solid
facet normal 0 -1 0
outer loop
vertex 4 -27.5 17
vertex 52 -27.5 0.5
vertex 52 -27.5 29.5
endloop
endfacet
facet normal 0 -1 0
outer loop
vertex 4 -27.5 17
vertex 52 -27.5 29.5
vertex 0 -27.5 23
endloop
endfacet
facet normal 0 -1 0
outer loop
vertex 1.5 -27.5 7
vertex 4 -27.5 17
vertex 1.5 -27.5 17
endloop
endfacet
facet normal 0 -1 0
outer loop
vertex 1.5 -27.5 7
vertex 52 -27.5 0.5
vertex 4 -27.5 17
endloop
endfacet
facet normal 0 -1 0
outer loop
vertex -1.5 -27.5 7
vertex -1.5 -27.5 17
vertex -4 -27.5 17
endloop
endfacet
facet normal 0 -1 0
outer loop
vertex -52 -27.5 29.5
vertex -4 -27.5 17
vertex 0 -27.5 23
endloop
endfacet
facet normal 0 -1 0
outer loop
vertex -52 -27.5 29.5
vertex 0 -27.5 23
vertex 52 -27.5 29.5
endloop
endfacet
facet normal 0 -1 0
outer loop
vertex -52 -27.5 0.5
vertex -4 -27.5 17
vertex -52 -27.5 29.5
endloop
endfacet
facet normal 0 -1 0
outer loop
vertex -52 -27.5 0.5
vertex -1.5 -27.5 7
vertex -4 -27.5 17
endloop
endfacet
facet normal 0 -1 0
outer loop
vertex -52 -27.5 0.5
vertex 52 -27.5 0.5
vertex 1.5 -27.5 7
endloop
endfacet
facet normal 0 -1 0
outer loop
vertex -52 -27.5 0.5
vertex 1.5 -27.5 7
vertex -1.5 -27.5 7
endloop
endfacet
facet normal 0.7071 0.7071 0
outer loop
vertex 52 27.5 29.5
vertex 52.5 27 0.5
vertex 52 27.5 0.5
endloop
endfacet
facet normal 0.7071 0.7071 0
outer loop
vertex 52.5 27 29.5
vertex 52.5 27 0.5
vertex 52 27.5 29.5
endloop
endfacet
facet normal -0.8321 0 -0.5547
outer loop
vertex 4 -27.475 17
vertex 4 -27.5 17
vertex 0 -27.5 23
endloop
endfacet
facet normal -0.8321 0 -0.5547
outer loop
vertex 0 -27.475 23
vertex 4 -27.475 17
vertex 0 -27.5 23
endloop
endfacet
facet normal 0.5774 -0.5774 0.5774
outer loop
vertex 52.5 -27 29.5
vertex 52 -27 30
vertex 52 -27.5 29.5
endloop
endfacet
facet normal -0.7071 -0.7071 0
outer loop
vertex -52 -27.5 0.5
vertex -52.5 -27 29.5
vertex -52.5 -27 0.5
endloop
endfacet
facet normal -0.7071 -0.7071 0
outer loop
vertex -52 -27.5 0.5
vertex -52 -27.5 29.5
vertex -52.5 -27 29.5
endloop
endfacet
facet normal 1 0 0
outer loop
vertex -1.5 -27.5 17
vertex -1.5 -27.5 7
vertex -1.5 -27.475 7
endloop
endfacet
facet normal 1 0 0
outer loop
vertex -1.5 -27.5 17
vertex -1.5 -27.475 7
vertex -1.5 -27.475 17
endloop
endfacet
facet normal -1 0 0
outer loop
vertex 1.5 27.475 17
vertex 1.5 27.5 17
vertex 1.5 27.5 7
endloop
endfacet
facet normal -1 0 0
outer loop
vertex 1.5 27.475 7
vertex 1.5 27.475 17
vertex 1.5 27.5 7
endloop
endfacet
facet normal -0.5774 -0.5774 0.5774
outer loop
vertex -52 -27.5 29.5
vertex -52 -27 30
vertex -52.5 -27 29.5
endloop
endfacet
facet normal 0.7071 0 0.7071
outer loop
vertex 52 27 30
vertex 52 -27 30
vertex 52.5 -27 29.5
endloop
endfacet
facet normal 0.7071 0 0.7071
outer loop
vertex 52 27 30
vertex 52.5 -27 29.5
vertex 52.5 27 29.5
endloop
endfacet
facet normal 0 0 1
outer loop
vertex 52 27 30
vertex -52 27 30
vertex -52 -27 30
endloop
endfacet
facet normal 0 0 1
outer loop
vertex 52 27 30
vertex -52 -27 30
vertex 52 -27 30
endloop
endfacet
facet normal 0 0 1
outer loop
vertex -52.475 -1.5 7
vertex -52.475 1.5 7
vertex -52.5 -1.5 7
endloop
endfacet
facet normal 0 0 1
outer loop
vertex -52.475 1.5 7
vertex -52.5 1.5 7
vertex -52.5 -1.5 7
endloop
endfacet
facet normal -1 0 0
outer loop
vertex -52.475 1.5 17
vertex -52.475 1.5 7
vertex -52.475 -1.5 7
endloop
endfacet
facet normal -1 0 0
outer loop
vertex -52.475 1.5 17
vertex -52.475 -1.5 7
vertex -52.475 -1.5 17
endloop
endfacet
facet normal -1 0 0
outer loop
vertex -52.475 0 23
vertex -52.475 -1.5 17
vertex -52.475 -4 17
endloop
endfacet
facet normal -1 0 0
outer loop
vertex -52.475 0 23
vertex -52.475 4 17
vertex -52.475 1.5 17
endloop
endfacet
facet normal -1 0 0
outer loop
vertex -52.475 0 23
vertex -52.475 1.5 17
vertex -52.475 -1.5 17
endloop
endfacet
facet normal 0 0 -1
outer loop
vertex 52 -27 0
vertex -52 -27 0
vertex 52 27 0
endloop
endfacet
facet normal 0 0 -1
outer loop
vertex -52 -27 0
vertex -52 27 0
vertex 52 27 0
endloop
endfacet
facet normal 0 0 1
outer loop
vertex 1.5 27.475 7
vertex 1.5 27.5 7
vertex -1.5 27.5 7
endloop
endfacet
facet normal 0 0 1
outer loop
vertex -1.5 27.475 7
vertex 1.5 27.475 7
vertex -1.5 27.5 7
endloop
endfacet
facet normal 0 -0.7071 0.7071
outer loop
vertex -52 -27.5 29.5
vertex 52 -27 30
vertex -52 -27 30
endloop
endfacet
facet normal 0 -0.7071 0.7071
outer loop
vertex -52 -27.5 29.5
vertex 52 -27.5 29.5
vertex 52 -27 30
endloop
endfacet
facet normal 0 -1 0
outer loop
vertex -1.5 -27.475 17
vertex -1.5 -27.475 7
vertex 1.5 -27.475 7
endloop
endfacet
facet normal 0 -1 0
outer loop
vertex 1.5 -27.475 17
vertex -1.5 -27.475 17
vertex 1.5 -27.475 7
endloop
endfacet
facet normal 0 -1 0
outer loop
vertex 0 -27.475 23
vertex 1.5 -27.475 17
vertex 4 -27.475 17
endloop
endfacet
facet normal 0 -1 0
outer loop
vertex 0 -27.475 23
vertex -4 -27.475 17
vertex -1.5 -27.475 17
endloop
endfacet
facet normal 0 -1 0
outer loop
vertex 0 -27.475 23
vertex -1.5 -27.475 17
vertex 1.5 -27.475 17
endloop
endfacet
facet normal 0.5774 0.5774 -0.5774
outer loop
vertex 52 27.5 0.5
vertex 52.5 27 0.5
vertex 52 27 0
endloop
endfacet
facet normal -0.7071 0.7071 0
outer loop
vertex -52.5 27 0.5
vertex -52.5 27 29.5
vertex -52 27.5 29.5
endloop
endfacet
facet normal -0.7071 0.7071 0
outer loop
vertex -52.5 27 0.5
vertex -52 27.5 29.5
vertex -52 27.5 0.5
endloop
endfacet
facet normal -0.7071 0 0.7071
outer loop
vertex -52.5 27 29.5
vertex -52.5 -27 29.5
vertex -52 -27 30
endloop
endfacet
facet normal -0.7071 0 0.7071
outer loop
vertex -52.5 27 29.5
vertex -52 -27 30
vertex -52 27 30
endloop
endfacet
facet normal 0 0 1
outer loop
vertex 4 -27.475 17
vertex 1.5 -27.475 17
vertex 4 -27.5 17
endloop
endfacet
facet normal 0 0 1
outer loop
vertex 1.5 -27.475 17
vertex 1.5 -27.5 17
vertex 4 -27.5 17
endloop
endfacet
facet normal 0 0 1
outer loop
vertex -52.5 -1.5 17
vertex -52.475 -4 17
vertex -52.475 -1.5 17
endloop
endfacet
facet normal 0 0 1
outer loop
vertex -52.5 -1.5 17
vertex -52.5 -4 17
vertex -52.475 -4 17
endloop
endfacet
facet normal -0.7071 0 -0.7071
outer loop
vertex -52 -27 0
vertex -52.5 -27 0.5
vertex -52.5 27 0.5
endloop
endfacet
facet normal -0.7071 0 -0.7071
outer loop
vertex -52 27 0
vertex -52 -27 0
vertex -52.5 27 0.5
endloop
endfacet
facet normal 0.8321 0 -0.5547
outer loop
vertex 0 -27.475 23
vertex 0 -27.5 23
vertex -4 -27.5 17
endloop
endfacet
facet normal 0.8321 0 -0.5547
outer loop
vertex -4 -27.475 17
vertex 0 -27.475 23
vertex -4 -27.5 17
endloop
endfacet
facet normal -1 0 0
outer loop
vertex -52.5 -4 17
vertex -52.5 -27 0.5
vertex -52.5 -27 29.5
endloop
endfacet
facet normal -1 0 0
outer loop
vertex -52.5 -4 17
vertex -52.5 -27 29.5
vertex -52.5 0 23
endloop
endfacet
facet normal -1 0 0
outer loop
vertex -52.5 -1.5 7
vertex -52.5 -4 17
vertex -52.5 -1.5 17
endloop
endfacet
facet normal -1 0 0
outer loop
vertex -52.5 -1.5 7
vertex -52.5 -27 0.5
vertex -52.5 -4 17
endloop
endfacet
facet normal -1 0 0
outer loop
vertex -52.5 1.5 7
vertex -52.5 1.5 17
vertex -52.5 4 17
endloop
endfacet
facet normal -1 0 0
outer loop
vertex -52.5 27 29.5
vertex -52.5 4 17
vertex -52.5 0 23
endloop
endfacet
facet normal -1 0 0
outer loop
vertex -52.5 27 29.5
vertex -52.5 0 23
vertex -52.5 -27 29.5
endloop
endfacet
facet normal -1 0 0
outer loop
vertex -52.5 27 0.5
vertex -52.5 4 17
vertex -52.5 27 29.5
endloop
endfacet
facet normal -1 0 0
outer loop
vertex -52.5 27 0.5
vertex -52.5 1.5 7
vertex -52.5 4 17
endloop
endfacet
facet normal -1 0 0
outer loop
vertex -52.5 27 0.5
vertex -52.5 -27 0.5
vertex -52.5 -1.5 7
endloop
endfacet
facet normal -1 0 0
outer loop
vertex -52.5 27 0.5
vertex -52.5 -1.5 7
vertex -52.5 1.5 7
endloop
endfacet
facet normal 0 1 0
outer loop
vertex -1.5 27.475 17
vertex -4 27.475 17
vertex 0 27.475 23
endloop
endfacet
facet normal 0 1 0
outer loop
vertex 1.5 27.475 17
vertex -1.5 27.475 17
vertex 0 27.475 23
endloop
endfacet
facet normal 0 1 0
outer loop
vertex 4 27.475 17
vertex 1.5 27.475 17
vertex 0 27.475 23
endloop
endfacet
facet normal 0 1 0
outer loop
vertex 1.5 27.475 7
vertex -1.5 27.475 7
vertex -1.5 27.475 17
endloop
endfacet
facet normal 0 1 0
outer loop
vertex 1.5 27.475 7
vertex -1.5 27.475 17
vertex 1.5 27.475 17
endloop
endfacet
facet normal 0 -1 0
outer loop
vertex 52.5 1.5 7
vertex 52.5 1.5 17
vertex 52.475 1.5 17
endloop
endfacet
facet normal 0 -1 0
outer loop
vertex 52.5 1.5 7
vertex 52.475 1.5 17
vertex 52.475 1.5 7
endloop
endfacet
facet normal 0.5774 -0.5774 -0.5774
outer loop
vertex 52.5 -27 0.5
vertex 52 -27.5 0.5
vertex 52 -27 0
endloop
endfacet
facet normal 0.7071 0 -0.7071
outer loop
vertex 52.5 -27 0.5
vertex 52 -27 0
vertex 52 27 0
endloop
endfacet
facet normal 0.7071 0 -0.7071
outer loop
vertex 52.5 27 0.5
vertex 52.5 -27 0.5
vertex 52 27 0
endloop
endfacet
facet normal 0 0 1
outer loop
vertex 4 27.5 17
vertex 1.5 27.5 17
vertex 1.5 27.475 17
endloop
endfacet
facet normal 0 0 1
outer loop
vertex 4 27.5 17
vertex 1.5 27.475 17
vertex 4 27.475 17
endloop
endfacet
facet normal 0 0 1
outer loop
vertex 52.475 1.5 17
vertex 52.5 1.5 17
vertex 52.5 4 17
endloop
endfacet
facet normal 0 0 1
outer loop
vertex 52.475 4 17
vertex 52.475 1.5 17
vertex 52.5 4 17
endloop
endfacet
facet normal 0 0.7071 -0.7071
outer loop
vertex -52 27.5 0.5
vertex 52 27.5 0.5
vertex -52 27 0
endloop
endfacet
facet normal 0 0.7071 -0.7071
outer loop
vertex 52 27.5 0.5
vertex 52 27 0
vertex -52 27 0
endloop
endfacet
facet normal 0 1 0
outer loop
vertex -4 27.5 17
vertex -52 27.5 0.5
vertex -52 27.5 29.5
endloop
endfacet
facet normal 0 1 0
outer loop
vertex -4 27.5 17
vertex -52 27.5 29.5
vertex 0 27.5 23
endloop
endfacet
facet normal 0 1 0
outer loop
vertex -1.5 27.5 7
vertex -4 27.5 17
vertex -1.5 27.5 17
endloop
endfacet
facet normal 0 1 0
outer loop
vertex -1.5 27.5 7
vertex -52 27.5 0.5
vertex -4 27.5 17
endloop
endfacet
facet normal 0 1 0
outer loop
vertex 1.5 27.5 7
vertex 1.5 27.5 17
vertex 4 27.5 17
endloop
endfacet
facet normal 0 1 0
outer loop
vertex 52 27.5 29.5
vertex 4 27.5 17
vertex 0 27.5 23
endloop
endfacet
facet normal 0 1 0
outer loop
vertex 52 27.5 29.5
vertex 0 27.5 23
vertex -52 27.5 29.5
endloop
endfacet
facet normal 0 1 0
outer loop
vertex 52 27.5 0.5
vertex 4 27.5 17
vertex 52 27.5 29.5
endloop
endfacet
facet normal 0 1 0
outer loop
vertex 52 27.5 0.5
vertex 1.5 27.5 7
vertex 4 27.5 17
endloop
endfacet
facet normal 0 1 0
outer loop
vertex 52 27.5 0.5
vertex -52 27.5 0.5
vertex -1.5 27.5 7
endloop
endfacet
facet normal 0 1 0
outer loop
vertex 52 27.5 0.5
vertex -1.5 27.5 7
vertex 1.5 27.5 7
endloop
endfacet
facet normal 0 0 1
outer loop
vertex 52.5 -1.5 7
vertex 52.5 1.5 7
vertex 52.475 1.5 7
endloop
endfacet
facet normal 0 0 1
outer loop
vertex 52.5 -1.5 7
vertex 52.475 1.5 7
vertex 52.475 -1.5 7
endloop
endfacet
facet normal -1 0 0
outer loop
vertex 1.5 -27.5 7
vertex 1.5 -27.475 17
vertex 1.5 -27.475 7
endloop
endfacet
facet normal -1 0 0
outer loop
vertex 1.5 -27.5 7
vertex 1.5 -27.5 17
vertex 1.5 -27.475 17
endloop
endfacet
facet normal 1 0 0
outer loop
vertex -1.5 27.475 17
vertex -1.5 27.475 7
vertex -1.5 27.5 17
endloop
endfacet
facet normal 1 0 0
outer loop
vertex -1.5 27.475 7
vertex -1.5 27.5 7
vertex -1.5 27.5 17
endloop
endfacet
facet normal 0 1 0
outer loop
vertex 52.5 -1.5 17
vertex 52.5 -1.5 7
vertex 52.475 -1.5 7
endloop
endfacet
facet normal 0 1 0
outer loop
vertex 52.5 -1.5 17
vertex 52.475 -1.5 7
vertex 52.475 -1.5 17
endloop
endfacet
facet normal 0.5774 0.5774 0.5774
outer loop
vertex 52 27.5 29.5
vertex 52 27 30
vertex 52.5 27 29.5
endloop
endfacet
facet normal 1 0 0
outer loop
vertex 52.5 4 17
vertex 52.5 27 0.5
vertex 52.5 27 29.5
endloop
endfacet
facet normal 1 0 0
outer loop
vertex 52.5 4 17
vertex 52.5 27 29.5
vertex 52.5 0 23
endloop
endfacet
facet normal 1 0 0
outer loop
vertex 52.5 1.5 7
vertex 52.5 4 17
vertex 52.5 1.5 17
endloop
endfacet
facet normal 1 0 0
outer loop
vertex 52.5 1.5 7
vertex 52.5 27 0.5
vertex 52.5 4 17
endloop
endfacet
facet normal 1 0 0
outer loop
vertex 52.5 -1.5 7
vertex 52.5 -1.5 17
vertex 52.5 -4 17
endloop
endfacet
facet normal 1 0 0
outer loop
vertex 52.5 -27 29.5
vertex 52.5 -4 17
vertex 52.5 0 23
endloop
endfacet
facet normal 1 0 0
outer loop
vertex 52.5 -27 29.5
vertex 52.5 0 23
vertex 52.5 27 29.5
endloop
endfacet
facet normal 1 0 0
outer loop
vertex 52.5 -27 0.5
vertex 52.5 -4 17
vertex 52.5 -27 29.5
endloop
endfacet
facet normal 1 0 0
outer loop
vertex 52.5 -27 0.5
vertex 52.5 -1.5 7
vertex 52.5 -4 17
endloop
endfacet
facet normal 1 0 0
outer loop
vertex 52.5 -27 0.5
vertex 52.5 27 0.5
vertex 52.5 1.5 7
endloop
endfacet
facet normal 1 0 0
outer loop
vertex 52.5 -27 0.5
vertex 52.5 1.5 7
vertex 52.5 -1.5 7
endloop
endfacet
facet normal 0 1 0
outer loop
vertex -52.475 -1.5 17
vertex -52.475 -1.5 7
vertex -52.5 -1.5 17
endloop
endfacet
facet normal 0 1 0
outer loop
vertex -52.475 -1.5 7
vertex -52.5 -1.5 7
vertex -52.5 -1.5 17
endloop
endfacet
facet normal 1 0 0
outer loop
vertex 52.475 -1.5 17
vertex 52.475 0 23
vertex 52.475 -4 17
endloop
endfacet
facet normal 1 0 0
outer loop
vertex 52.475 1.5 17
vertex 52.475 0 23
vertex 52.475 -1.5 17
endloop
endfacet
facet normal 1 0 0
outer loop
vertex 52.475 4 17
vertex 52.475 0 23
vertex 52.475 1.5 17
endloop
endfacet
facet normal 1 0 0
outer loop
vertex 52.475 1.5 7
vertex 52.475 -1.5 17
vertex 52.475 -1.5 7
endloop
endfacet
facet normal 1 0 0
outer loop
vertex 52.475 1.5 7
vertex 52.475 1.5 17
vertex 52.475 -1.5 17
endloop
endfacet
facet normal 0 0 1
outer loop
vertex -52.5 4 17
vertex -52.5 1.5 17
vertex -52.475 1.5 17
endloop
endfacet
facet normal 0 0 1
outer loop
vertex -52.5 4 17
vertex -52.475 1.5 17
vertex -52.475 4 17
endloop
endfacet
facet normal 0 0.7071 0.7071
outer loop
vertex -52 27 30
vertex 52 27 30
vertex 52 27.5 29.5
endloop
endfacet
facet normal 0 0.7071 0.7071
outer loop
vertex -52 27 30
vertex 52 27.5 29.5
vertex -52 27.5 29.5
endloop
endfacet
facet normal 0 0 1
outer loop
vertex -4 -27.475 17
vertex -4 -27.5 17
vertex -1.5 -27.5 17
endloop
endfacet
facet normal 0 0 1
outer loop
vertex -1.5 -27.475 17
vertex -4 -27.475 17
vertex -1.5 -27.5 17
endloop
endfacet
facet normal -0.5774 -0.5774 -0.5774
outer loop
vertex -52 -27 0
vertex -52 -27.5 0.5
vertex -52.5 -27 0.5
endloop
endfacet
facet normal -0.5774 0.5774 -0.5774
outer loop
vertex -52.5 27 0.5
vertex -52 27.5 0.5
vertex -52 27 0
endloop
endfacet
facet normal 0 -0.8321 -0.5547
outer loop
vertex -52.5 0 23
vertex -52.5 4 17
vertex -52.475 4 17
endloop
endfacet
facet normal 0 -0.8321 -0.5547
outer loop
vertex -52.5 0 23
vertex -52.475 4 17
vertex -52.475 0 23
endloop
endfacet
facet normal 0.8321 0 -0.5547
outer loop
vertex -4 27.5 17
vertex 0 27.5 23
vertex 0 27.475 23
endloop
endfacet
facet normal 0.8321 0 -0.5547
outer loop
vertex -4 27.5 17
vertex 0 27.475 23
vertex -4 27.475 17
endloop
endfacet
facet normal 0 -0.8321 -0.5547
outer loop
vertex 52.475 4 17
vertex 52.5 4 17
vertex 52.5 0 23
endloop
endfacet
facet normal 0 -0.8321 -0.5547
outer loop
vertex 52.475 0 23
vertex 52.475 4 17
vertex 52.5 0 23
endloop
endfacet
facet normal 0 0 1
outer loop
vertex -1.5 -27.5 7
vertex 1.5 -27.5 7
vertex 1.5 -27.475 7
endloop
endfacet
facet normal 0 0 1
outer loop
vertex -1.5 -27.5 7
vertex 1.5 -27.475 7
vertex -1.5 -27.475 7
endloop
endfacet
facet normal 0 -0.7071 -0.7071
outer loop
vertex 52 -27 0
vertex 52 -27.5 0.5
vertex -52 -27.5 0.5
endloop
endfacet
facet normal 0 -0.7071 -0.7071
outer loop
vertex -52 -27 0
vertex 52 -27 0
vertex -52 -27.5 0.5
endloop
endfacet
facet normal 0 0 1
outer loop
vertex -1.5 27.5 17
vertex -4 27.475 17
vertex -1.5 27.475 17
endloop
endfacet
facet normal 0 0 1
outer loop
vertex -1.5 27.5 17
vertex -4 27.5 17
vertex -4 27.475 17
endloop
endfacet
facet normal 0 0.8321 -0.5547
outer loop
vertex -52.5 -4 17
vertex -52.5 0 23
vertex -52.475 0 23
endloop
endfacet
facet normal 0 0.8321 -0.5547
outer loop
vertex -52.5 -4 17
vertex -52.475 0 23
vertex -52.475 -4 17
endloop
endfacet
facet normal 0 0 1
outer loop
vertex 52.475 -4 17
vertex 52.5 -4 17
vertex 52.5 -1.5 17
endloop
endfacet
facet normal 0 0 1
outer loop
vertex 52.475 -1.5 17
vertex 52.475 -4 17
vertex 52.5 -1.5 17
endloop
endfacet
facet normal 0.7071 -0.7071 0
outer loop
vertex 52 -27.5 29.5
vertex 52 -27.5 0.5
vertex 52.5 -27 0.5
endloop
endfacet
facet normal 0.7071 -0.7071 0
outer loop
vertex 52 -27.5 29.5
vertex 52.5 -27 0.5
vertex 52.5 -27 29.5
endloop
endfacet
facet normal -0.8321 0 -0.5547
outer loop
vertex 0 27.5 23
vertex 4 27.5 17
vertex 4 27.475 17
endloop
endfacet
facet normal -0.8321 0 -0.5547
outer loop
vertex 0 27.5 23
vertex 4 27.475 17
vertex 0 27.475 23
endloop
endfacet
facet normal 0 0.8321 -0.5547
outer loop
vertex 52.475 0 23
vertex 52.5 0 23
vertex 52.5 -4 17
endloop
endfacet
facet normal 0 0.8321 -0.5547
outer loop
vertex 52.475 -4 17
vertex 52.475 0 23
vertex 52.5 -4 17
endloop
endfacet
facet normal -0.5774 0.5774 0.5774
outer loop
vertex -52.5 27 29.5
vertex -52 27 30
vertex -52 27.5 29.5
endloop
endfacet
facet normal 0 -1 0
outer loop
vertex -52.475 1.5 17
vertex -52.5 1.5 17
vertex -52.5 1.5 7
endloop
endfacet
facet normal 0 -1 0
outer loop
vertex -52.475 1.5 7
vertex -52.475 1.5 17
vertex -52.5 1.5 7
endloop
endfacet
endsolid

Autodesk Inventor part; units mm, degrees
ref_plane "YZ Plane" through (0, 0, 0) normal (1, 0, 0) x (0, 1, 0)
ref_plane "XZ Plane" through (0, 0, 0) normal (0, 1, 0) x (-1, 0, 0)
ref_plane "XY Plane" through (0, 0, 0) normal (0, 0, 1) x (1, 0, 0)
sketch "Sketch1" plane through (0, 0, 0) normal (0, 0, 1) x (1, 0, 0)
  line L0 (0, 38.5) -> (0, -38.5) projected
  line L1 (-73.5, 0) -> (73.5, 0) projected
  line L2 (-52.5, 27.5) -> (52.5, 27.5)
  line L3 (52.5, 27.5) -> (52.5, -27.5)
  line L4 (52.5, -27.5) -> (-52.5, -27.5)
  line L5 (-52.5, -27.5) -> (-52.5, 27.5)
  point P0 (0, 0)
  point P1 (0, 27.5)
  point P2 (52.5, 0)
  dimension "d0" = 55
  dimension "d1" = 105
extrude "Extrusion1" add sketch "Sketch1" along normal blind 30
chamfer "Chamfer1" distance 0.5 angle 45 12 edges at (0, -27.5, 30) (-52.5, 0, 30) (0, 27.5, 30) (52.5, 0, 30) (52.5, 27.5, 15) (52.5, -27.5, 15) (-52.5, -27.5, 15) (0, -27.5, 0) (52.5, 0, 0) (0, 27.5, 0) (-52.5, 27.5, 15) (-52.5, 0, 0)
sketch "Sketch2" plane through (-52, -27.5, 0.5) normal (0, -1, 0) x (1, 0, 0)
  line L0 (0, 0) -> (0, 29) projected
  line L1 (52, 22.5) -> (48, 16.5)
  line L2 (48, 16.5) -> (56, 16.5)
  line L3 (56, 16.5) -> (52, 22.5)
  line L4 (50.5, 16.5) -> (53.5, 16.5)
  line L5 (53.5, 16.5) -> (53.5, 6.5)
  line L6 (53.5, 6.5) -> (50.5, 6.5)
  line L7 (50.5, 6.5) -> (50.5, 16.5)
  line L8 (52, 22.5) -> (52, 4.7859)
  line L9 (104, 29.5) -> (0, 29.5) projected
  point P0 (52, -0.5)
  dimension "d7" = 8
  dimension "d8" = 3
  dimension "d9" = 4
  dimension "d10" = 1.5
  dimension "d11" = 7
  dimension "d12" = 6
  dimension "d13" = 10
extrude "Extrusion2" cut sketch "Sketch2" against normal blind 0.025
sketch "Sketch3" plane through (-52, 27.5, 0.5) normal (0, 1, 0) x (1, 0, 0)
  line L0 (53.5, -6.5) -> (50.5, -6.5)
  line L1 (52, -22.5) -> (48, -16.5)
  line L2 (48, -16.5) -> (56, -16.5)
  line L3 (56, -16.5) -> (52, -22.5)
  line L4 (53.5, -16.5) -> (53.5, -6.5)
  line L5 (50.5, -6.5) -> (50.5, -16.5)
  line L6 (0, -29.5) -> (104, -29.5) projected
  line L7 (50.5, -6.5) -> (53.5, -6.5)
  line L8 (53.5, -6.5) -> (53.5, -16.5)
  line L9 (50.5, -16.5) -> (53.5, -16.5)
  line L10 (50.5, -16.5) -> (50.5, -6.5)
  point P0 (52, 0.5)
  point P1 (52, -6.5)
  dimension "d17" = 3
  dimension "d25" = 7
extrude "Extrusion3" cut sketch "Sketch3" against normal blind 0.025
sketch "Sketch4" plane through (52.5, -27, 0.5) normal (1, 0, 0) x (0, 0, -1)
  line L0 (-22.5, 27) -> (-16.5, 23)
  line L1 (-16.5, 23) -> (-16.5, 31)
  line L2 (-16.5, 31) -> (-22.5, 27)
  line L3 (-16.5, 25.5) -> (-16.5, 28.5)
  line L4 (-16.5, 28.5) -> (-6.5, 28.5)
  line L5 (-6.5, 28.5) -> (-6.5, 25.5)
  line L6 (-6.5, 25.5) -> (-16.5, 25.5)
  line L7 (-22.5, 27) -> (-5.1122, 27)
  line L8 (-29.5, 54) -> (-29.5, 0) projected
  point P0 (0.5, 27)
  dimension "d37" = 74.49
  dimension "d39" = 3
  dimension "d40" = 8
  dimension "d41" = 16
  dimension "d42" = 6
  dimension "d43" = 1.5
  dimension "d44" = 67.38
  dimension "d45" = 7
  dimension "d48" = 7
extrude "Extrusion4" cut sketch "Sketch4" against normal blind 0.025
sketch "Sketch5" plane through (-52.5, -27, 0.5) normal (-1, 0, 0) x (0, 0, 1)
  line L0 (22.5, 27) -> (16.5, 23)
  line L1 (16.5, 23) -> (16.5, 31)
  line L2 (16.5, 31) -> (22.5, 27)
  line L3 (16.5, 25.5) -> (16.5, 28.5)
  line L4 (16.5, 28.5) -> (6.5, 28.5)
  line L5 (6.5, 28.5) -> (6.5, 25.5)
  line L6 (6.5, 25.5) -> (16.5, 25.5)
  line L7 (22.5, 27) -> (5.6122, 27)
  line L8 (29.5, 0) -> (29.5, 54) projected
  point P0 (-0.5, 27)
  point P1 (29.5, 27)
  dimension "d57" = 16
  dimension "d58" = 7
  dimension "d59" = 3
  dimension "d60" = 1.5
  dimension "d61" = 67.38
  dimension "d62" = 6
extrude "Extrusion5" cut sketch "Sketch5" against normal blind 0.025
equation "\"d9\" = 0.5 * d7"
equation "\"d10\" = 0.5 * d8"
properties part number "Bloco de NdFeB - N45SH." material "NdFeB (Neodímio Ferro Boro)"
